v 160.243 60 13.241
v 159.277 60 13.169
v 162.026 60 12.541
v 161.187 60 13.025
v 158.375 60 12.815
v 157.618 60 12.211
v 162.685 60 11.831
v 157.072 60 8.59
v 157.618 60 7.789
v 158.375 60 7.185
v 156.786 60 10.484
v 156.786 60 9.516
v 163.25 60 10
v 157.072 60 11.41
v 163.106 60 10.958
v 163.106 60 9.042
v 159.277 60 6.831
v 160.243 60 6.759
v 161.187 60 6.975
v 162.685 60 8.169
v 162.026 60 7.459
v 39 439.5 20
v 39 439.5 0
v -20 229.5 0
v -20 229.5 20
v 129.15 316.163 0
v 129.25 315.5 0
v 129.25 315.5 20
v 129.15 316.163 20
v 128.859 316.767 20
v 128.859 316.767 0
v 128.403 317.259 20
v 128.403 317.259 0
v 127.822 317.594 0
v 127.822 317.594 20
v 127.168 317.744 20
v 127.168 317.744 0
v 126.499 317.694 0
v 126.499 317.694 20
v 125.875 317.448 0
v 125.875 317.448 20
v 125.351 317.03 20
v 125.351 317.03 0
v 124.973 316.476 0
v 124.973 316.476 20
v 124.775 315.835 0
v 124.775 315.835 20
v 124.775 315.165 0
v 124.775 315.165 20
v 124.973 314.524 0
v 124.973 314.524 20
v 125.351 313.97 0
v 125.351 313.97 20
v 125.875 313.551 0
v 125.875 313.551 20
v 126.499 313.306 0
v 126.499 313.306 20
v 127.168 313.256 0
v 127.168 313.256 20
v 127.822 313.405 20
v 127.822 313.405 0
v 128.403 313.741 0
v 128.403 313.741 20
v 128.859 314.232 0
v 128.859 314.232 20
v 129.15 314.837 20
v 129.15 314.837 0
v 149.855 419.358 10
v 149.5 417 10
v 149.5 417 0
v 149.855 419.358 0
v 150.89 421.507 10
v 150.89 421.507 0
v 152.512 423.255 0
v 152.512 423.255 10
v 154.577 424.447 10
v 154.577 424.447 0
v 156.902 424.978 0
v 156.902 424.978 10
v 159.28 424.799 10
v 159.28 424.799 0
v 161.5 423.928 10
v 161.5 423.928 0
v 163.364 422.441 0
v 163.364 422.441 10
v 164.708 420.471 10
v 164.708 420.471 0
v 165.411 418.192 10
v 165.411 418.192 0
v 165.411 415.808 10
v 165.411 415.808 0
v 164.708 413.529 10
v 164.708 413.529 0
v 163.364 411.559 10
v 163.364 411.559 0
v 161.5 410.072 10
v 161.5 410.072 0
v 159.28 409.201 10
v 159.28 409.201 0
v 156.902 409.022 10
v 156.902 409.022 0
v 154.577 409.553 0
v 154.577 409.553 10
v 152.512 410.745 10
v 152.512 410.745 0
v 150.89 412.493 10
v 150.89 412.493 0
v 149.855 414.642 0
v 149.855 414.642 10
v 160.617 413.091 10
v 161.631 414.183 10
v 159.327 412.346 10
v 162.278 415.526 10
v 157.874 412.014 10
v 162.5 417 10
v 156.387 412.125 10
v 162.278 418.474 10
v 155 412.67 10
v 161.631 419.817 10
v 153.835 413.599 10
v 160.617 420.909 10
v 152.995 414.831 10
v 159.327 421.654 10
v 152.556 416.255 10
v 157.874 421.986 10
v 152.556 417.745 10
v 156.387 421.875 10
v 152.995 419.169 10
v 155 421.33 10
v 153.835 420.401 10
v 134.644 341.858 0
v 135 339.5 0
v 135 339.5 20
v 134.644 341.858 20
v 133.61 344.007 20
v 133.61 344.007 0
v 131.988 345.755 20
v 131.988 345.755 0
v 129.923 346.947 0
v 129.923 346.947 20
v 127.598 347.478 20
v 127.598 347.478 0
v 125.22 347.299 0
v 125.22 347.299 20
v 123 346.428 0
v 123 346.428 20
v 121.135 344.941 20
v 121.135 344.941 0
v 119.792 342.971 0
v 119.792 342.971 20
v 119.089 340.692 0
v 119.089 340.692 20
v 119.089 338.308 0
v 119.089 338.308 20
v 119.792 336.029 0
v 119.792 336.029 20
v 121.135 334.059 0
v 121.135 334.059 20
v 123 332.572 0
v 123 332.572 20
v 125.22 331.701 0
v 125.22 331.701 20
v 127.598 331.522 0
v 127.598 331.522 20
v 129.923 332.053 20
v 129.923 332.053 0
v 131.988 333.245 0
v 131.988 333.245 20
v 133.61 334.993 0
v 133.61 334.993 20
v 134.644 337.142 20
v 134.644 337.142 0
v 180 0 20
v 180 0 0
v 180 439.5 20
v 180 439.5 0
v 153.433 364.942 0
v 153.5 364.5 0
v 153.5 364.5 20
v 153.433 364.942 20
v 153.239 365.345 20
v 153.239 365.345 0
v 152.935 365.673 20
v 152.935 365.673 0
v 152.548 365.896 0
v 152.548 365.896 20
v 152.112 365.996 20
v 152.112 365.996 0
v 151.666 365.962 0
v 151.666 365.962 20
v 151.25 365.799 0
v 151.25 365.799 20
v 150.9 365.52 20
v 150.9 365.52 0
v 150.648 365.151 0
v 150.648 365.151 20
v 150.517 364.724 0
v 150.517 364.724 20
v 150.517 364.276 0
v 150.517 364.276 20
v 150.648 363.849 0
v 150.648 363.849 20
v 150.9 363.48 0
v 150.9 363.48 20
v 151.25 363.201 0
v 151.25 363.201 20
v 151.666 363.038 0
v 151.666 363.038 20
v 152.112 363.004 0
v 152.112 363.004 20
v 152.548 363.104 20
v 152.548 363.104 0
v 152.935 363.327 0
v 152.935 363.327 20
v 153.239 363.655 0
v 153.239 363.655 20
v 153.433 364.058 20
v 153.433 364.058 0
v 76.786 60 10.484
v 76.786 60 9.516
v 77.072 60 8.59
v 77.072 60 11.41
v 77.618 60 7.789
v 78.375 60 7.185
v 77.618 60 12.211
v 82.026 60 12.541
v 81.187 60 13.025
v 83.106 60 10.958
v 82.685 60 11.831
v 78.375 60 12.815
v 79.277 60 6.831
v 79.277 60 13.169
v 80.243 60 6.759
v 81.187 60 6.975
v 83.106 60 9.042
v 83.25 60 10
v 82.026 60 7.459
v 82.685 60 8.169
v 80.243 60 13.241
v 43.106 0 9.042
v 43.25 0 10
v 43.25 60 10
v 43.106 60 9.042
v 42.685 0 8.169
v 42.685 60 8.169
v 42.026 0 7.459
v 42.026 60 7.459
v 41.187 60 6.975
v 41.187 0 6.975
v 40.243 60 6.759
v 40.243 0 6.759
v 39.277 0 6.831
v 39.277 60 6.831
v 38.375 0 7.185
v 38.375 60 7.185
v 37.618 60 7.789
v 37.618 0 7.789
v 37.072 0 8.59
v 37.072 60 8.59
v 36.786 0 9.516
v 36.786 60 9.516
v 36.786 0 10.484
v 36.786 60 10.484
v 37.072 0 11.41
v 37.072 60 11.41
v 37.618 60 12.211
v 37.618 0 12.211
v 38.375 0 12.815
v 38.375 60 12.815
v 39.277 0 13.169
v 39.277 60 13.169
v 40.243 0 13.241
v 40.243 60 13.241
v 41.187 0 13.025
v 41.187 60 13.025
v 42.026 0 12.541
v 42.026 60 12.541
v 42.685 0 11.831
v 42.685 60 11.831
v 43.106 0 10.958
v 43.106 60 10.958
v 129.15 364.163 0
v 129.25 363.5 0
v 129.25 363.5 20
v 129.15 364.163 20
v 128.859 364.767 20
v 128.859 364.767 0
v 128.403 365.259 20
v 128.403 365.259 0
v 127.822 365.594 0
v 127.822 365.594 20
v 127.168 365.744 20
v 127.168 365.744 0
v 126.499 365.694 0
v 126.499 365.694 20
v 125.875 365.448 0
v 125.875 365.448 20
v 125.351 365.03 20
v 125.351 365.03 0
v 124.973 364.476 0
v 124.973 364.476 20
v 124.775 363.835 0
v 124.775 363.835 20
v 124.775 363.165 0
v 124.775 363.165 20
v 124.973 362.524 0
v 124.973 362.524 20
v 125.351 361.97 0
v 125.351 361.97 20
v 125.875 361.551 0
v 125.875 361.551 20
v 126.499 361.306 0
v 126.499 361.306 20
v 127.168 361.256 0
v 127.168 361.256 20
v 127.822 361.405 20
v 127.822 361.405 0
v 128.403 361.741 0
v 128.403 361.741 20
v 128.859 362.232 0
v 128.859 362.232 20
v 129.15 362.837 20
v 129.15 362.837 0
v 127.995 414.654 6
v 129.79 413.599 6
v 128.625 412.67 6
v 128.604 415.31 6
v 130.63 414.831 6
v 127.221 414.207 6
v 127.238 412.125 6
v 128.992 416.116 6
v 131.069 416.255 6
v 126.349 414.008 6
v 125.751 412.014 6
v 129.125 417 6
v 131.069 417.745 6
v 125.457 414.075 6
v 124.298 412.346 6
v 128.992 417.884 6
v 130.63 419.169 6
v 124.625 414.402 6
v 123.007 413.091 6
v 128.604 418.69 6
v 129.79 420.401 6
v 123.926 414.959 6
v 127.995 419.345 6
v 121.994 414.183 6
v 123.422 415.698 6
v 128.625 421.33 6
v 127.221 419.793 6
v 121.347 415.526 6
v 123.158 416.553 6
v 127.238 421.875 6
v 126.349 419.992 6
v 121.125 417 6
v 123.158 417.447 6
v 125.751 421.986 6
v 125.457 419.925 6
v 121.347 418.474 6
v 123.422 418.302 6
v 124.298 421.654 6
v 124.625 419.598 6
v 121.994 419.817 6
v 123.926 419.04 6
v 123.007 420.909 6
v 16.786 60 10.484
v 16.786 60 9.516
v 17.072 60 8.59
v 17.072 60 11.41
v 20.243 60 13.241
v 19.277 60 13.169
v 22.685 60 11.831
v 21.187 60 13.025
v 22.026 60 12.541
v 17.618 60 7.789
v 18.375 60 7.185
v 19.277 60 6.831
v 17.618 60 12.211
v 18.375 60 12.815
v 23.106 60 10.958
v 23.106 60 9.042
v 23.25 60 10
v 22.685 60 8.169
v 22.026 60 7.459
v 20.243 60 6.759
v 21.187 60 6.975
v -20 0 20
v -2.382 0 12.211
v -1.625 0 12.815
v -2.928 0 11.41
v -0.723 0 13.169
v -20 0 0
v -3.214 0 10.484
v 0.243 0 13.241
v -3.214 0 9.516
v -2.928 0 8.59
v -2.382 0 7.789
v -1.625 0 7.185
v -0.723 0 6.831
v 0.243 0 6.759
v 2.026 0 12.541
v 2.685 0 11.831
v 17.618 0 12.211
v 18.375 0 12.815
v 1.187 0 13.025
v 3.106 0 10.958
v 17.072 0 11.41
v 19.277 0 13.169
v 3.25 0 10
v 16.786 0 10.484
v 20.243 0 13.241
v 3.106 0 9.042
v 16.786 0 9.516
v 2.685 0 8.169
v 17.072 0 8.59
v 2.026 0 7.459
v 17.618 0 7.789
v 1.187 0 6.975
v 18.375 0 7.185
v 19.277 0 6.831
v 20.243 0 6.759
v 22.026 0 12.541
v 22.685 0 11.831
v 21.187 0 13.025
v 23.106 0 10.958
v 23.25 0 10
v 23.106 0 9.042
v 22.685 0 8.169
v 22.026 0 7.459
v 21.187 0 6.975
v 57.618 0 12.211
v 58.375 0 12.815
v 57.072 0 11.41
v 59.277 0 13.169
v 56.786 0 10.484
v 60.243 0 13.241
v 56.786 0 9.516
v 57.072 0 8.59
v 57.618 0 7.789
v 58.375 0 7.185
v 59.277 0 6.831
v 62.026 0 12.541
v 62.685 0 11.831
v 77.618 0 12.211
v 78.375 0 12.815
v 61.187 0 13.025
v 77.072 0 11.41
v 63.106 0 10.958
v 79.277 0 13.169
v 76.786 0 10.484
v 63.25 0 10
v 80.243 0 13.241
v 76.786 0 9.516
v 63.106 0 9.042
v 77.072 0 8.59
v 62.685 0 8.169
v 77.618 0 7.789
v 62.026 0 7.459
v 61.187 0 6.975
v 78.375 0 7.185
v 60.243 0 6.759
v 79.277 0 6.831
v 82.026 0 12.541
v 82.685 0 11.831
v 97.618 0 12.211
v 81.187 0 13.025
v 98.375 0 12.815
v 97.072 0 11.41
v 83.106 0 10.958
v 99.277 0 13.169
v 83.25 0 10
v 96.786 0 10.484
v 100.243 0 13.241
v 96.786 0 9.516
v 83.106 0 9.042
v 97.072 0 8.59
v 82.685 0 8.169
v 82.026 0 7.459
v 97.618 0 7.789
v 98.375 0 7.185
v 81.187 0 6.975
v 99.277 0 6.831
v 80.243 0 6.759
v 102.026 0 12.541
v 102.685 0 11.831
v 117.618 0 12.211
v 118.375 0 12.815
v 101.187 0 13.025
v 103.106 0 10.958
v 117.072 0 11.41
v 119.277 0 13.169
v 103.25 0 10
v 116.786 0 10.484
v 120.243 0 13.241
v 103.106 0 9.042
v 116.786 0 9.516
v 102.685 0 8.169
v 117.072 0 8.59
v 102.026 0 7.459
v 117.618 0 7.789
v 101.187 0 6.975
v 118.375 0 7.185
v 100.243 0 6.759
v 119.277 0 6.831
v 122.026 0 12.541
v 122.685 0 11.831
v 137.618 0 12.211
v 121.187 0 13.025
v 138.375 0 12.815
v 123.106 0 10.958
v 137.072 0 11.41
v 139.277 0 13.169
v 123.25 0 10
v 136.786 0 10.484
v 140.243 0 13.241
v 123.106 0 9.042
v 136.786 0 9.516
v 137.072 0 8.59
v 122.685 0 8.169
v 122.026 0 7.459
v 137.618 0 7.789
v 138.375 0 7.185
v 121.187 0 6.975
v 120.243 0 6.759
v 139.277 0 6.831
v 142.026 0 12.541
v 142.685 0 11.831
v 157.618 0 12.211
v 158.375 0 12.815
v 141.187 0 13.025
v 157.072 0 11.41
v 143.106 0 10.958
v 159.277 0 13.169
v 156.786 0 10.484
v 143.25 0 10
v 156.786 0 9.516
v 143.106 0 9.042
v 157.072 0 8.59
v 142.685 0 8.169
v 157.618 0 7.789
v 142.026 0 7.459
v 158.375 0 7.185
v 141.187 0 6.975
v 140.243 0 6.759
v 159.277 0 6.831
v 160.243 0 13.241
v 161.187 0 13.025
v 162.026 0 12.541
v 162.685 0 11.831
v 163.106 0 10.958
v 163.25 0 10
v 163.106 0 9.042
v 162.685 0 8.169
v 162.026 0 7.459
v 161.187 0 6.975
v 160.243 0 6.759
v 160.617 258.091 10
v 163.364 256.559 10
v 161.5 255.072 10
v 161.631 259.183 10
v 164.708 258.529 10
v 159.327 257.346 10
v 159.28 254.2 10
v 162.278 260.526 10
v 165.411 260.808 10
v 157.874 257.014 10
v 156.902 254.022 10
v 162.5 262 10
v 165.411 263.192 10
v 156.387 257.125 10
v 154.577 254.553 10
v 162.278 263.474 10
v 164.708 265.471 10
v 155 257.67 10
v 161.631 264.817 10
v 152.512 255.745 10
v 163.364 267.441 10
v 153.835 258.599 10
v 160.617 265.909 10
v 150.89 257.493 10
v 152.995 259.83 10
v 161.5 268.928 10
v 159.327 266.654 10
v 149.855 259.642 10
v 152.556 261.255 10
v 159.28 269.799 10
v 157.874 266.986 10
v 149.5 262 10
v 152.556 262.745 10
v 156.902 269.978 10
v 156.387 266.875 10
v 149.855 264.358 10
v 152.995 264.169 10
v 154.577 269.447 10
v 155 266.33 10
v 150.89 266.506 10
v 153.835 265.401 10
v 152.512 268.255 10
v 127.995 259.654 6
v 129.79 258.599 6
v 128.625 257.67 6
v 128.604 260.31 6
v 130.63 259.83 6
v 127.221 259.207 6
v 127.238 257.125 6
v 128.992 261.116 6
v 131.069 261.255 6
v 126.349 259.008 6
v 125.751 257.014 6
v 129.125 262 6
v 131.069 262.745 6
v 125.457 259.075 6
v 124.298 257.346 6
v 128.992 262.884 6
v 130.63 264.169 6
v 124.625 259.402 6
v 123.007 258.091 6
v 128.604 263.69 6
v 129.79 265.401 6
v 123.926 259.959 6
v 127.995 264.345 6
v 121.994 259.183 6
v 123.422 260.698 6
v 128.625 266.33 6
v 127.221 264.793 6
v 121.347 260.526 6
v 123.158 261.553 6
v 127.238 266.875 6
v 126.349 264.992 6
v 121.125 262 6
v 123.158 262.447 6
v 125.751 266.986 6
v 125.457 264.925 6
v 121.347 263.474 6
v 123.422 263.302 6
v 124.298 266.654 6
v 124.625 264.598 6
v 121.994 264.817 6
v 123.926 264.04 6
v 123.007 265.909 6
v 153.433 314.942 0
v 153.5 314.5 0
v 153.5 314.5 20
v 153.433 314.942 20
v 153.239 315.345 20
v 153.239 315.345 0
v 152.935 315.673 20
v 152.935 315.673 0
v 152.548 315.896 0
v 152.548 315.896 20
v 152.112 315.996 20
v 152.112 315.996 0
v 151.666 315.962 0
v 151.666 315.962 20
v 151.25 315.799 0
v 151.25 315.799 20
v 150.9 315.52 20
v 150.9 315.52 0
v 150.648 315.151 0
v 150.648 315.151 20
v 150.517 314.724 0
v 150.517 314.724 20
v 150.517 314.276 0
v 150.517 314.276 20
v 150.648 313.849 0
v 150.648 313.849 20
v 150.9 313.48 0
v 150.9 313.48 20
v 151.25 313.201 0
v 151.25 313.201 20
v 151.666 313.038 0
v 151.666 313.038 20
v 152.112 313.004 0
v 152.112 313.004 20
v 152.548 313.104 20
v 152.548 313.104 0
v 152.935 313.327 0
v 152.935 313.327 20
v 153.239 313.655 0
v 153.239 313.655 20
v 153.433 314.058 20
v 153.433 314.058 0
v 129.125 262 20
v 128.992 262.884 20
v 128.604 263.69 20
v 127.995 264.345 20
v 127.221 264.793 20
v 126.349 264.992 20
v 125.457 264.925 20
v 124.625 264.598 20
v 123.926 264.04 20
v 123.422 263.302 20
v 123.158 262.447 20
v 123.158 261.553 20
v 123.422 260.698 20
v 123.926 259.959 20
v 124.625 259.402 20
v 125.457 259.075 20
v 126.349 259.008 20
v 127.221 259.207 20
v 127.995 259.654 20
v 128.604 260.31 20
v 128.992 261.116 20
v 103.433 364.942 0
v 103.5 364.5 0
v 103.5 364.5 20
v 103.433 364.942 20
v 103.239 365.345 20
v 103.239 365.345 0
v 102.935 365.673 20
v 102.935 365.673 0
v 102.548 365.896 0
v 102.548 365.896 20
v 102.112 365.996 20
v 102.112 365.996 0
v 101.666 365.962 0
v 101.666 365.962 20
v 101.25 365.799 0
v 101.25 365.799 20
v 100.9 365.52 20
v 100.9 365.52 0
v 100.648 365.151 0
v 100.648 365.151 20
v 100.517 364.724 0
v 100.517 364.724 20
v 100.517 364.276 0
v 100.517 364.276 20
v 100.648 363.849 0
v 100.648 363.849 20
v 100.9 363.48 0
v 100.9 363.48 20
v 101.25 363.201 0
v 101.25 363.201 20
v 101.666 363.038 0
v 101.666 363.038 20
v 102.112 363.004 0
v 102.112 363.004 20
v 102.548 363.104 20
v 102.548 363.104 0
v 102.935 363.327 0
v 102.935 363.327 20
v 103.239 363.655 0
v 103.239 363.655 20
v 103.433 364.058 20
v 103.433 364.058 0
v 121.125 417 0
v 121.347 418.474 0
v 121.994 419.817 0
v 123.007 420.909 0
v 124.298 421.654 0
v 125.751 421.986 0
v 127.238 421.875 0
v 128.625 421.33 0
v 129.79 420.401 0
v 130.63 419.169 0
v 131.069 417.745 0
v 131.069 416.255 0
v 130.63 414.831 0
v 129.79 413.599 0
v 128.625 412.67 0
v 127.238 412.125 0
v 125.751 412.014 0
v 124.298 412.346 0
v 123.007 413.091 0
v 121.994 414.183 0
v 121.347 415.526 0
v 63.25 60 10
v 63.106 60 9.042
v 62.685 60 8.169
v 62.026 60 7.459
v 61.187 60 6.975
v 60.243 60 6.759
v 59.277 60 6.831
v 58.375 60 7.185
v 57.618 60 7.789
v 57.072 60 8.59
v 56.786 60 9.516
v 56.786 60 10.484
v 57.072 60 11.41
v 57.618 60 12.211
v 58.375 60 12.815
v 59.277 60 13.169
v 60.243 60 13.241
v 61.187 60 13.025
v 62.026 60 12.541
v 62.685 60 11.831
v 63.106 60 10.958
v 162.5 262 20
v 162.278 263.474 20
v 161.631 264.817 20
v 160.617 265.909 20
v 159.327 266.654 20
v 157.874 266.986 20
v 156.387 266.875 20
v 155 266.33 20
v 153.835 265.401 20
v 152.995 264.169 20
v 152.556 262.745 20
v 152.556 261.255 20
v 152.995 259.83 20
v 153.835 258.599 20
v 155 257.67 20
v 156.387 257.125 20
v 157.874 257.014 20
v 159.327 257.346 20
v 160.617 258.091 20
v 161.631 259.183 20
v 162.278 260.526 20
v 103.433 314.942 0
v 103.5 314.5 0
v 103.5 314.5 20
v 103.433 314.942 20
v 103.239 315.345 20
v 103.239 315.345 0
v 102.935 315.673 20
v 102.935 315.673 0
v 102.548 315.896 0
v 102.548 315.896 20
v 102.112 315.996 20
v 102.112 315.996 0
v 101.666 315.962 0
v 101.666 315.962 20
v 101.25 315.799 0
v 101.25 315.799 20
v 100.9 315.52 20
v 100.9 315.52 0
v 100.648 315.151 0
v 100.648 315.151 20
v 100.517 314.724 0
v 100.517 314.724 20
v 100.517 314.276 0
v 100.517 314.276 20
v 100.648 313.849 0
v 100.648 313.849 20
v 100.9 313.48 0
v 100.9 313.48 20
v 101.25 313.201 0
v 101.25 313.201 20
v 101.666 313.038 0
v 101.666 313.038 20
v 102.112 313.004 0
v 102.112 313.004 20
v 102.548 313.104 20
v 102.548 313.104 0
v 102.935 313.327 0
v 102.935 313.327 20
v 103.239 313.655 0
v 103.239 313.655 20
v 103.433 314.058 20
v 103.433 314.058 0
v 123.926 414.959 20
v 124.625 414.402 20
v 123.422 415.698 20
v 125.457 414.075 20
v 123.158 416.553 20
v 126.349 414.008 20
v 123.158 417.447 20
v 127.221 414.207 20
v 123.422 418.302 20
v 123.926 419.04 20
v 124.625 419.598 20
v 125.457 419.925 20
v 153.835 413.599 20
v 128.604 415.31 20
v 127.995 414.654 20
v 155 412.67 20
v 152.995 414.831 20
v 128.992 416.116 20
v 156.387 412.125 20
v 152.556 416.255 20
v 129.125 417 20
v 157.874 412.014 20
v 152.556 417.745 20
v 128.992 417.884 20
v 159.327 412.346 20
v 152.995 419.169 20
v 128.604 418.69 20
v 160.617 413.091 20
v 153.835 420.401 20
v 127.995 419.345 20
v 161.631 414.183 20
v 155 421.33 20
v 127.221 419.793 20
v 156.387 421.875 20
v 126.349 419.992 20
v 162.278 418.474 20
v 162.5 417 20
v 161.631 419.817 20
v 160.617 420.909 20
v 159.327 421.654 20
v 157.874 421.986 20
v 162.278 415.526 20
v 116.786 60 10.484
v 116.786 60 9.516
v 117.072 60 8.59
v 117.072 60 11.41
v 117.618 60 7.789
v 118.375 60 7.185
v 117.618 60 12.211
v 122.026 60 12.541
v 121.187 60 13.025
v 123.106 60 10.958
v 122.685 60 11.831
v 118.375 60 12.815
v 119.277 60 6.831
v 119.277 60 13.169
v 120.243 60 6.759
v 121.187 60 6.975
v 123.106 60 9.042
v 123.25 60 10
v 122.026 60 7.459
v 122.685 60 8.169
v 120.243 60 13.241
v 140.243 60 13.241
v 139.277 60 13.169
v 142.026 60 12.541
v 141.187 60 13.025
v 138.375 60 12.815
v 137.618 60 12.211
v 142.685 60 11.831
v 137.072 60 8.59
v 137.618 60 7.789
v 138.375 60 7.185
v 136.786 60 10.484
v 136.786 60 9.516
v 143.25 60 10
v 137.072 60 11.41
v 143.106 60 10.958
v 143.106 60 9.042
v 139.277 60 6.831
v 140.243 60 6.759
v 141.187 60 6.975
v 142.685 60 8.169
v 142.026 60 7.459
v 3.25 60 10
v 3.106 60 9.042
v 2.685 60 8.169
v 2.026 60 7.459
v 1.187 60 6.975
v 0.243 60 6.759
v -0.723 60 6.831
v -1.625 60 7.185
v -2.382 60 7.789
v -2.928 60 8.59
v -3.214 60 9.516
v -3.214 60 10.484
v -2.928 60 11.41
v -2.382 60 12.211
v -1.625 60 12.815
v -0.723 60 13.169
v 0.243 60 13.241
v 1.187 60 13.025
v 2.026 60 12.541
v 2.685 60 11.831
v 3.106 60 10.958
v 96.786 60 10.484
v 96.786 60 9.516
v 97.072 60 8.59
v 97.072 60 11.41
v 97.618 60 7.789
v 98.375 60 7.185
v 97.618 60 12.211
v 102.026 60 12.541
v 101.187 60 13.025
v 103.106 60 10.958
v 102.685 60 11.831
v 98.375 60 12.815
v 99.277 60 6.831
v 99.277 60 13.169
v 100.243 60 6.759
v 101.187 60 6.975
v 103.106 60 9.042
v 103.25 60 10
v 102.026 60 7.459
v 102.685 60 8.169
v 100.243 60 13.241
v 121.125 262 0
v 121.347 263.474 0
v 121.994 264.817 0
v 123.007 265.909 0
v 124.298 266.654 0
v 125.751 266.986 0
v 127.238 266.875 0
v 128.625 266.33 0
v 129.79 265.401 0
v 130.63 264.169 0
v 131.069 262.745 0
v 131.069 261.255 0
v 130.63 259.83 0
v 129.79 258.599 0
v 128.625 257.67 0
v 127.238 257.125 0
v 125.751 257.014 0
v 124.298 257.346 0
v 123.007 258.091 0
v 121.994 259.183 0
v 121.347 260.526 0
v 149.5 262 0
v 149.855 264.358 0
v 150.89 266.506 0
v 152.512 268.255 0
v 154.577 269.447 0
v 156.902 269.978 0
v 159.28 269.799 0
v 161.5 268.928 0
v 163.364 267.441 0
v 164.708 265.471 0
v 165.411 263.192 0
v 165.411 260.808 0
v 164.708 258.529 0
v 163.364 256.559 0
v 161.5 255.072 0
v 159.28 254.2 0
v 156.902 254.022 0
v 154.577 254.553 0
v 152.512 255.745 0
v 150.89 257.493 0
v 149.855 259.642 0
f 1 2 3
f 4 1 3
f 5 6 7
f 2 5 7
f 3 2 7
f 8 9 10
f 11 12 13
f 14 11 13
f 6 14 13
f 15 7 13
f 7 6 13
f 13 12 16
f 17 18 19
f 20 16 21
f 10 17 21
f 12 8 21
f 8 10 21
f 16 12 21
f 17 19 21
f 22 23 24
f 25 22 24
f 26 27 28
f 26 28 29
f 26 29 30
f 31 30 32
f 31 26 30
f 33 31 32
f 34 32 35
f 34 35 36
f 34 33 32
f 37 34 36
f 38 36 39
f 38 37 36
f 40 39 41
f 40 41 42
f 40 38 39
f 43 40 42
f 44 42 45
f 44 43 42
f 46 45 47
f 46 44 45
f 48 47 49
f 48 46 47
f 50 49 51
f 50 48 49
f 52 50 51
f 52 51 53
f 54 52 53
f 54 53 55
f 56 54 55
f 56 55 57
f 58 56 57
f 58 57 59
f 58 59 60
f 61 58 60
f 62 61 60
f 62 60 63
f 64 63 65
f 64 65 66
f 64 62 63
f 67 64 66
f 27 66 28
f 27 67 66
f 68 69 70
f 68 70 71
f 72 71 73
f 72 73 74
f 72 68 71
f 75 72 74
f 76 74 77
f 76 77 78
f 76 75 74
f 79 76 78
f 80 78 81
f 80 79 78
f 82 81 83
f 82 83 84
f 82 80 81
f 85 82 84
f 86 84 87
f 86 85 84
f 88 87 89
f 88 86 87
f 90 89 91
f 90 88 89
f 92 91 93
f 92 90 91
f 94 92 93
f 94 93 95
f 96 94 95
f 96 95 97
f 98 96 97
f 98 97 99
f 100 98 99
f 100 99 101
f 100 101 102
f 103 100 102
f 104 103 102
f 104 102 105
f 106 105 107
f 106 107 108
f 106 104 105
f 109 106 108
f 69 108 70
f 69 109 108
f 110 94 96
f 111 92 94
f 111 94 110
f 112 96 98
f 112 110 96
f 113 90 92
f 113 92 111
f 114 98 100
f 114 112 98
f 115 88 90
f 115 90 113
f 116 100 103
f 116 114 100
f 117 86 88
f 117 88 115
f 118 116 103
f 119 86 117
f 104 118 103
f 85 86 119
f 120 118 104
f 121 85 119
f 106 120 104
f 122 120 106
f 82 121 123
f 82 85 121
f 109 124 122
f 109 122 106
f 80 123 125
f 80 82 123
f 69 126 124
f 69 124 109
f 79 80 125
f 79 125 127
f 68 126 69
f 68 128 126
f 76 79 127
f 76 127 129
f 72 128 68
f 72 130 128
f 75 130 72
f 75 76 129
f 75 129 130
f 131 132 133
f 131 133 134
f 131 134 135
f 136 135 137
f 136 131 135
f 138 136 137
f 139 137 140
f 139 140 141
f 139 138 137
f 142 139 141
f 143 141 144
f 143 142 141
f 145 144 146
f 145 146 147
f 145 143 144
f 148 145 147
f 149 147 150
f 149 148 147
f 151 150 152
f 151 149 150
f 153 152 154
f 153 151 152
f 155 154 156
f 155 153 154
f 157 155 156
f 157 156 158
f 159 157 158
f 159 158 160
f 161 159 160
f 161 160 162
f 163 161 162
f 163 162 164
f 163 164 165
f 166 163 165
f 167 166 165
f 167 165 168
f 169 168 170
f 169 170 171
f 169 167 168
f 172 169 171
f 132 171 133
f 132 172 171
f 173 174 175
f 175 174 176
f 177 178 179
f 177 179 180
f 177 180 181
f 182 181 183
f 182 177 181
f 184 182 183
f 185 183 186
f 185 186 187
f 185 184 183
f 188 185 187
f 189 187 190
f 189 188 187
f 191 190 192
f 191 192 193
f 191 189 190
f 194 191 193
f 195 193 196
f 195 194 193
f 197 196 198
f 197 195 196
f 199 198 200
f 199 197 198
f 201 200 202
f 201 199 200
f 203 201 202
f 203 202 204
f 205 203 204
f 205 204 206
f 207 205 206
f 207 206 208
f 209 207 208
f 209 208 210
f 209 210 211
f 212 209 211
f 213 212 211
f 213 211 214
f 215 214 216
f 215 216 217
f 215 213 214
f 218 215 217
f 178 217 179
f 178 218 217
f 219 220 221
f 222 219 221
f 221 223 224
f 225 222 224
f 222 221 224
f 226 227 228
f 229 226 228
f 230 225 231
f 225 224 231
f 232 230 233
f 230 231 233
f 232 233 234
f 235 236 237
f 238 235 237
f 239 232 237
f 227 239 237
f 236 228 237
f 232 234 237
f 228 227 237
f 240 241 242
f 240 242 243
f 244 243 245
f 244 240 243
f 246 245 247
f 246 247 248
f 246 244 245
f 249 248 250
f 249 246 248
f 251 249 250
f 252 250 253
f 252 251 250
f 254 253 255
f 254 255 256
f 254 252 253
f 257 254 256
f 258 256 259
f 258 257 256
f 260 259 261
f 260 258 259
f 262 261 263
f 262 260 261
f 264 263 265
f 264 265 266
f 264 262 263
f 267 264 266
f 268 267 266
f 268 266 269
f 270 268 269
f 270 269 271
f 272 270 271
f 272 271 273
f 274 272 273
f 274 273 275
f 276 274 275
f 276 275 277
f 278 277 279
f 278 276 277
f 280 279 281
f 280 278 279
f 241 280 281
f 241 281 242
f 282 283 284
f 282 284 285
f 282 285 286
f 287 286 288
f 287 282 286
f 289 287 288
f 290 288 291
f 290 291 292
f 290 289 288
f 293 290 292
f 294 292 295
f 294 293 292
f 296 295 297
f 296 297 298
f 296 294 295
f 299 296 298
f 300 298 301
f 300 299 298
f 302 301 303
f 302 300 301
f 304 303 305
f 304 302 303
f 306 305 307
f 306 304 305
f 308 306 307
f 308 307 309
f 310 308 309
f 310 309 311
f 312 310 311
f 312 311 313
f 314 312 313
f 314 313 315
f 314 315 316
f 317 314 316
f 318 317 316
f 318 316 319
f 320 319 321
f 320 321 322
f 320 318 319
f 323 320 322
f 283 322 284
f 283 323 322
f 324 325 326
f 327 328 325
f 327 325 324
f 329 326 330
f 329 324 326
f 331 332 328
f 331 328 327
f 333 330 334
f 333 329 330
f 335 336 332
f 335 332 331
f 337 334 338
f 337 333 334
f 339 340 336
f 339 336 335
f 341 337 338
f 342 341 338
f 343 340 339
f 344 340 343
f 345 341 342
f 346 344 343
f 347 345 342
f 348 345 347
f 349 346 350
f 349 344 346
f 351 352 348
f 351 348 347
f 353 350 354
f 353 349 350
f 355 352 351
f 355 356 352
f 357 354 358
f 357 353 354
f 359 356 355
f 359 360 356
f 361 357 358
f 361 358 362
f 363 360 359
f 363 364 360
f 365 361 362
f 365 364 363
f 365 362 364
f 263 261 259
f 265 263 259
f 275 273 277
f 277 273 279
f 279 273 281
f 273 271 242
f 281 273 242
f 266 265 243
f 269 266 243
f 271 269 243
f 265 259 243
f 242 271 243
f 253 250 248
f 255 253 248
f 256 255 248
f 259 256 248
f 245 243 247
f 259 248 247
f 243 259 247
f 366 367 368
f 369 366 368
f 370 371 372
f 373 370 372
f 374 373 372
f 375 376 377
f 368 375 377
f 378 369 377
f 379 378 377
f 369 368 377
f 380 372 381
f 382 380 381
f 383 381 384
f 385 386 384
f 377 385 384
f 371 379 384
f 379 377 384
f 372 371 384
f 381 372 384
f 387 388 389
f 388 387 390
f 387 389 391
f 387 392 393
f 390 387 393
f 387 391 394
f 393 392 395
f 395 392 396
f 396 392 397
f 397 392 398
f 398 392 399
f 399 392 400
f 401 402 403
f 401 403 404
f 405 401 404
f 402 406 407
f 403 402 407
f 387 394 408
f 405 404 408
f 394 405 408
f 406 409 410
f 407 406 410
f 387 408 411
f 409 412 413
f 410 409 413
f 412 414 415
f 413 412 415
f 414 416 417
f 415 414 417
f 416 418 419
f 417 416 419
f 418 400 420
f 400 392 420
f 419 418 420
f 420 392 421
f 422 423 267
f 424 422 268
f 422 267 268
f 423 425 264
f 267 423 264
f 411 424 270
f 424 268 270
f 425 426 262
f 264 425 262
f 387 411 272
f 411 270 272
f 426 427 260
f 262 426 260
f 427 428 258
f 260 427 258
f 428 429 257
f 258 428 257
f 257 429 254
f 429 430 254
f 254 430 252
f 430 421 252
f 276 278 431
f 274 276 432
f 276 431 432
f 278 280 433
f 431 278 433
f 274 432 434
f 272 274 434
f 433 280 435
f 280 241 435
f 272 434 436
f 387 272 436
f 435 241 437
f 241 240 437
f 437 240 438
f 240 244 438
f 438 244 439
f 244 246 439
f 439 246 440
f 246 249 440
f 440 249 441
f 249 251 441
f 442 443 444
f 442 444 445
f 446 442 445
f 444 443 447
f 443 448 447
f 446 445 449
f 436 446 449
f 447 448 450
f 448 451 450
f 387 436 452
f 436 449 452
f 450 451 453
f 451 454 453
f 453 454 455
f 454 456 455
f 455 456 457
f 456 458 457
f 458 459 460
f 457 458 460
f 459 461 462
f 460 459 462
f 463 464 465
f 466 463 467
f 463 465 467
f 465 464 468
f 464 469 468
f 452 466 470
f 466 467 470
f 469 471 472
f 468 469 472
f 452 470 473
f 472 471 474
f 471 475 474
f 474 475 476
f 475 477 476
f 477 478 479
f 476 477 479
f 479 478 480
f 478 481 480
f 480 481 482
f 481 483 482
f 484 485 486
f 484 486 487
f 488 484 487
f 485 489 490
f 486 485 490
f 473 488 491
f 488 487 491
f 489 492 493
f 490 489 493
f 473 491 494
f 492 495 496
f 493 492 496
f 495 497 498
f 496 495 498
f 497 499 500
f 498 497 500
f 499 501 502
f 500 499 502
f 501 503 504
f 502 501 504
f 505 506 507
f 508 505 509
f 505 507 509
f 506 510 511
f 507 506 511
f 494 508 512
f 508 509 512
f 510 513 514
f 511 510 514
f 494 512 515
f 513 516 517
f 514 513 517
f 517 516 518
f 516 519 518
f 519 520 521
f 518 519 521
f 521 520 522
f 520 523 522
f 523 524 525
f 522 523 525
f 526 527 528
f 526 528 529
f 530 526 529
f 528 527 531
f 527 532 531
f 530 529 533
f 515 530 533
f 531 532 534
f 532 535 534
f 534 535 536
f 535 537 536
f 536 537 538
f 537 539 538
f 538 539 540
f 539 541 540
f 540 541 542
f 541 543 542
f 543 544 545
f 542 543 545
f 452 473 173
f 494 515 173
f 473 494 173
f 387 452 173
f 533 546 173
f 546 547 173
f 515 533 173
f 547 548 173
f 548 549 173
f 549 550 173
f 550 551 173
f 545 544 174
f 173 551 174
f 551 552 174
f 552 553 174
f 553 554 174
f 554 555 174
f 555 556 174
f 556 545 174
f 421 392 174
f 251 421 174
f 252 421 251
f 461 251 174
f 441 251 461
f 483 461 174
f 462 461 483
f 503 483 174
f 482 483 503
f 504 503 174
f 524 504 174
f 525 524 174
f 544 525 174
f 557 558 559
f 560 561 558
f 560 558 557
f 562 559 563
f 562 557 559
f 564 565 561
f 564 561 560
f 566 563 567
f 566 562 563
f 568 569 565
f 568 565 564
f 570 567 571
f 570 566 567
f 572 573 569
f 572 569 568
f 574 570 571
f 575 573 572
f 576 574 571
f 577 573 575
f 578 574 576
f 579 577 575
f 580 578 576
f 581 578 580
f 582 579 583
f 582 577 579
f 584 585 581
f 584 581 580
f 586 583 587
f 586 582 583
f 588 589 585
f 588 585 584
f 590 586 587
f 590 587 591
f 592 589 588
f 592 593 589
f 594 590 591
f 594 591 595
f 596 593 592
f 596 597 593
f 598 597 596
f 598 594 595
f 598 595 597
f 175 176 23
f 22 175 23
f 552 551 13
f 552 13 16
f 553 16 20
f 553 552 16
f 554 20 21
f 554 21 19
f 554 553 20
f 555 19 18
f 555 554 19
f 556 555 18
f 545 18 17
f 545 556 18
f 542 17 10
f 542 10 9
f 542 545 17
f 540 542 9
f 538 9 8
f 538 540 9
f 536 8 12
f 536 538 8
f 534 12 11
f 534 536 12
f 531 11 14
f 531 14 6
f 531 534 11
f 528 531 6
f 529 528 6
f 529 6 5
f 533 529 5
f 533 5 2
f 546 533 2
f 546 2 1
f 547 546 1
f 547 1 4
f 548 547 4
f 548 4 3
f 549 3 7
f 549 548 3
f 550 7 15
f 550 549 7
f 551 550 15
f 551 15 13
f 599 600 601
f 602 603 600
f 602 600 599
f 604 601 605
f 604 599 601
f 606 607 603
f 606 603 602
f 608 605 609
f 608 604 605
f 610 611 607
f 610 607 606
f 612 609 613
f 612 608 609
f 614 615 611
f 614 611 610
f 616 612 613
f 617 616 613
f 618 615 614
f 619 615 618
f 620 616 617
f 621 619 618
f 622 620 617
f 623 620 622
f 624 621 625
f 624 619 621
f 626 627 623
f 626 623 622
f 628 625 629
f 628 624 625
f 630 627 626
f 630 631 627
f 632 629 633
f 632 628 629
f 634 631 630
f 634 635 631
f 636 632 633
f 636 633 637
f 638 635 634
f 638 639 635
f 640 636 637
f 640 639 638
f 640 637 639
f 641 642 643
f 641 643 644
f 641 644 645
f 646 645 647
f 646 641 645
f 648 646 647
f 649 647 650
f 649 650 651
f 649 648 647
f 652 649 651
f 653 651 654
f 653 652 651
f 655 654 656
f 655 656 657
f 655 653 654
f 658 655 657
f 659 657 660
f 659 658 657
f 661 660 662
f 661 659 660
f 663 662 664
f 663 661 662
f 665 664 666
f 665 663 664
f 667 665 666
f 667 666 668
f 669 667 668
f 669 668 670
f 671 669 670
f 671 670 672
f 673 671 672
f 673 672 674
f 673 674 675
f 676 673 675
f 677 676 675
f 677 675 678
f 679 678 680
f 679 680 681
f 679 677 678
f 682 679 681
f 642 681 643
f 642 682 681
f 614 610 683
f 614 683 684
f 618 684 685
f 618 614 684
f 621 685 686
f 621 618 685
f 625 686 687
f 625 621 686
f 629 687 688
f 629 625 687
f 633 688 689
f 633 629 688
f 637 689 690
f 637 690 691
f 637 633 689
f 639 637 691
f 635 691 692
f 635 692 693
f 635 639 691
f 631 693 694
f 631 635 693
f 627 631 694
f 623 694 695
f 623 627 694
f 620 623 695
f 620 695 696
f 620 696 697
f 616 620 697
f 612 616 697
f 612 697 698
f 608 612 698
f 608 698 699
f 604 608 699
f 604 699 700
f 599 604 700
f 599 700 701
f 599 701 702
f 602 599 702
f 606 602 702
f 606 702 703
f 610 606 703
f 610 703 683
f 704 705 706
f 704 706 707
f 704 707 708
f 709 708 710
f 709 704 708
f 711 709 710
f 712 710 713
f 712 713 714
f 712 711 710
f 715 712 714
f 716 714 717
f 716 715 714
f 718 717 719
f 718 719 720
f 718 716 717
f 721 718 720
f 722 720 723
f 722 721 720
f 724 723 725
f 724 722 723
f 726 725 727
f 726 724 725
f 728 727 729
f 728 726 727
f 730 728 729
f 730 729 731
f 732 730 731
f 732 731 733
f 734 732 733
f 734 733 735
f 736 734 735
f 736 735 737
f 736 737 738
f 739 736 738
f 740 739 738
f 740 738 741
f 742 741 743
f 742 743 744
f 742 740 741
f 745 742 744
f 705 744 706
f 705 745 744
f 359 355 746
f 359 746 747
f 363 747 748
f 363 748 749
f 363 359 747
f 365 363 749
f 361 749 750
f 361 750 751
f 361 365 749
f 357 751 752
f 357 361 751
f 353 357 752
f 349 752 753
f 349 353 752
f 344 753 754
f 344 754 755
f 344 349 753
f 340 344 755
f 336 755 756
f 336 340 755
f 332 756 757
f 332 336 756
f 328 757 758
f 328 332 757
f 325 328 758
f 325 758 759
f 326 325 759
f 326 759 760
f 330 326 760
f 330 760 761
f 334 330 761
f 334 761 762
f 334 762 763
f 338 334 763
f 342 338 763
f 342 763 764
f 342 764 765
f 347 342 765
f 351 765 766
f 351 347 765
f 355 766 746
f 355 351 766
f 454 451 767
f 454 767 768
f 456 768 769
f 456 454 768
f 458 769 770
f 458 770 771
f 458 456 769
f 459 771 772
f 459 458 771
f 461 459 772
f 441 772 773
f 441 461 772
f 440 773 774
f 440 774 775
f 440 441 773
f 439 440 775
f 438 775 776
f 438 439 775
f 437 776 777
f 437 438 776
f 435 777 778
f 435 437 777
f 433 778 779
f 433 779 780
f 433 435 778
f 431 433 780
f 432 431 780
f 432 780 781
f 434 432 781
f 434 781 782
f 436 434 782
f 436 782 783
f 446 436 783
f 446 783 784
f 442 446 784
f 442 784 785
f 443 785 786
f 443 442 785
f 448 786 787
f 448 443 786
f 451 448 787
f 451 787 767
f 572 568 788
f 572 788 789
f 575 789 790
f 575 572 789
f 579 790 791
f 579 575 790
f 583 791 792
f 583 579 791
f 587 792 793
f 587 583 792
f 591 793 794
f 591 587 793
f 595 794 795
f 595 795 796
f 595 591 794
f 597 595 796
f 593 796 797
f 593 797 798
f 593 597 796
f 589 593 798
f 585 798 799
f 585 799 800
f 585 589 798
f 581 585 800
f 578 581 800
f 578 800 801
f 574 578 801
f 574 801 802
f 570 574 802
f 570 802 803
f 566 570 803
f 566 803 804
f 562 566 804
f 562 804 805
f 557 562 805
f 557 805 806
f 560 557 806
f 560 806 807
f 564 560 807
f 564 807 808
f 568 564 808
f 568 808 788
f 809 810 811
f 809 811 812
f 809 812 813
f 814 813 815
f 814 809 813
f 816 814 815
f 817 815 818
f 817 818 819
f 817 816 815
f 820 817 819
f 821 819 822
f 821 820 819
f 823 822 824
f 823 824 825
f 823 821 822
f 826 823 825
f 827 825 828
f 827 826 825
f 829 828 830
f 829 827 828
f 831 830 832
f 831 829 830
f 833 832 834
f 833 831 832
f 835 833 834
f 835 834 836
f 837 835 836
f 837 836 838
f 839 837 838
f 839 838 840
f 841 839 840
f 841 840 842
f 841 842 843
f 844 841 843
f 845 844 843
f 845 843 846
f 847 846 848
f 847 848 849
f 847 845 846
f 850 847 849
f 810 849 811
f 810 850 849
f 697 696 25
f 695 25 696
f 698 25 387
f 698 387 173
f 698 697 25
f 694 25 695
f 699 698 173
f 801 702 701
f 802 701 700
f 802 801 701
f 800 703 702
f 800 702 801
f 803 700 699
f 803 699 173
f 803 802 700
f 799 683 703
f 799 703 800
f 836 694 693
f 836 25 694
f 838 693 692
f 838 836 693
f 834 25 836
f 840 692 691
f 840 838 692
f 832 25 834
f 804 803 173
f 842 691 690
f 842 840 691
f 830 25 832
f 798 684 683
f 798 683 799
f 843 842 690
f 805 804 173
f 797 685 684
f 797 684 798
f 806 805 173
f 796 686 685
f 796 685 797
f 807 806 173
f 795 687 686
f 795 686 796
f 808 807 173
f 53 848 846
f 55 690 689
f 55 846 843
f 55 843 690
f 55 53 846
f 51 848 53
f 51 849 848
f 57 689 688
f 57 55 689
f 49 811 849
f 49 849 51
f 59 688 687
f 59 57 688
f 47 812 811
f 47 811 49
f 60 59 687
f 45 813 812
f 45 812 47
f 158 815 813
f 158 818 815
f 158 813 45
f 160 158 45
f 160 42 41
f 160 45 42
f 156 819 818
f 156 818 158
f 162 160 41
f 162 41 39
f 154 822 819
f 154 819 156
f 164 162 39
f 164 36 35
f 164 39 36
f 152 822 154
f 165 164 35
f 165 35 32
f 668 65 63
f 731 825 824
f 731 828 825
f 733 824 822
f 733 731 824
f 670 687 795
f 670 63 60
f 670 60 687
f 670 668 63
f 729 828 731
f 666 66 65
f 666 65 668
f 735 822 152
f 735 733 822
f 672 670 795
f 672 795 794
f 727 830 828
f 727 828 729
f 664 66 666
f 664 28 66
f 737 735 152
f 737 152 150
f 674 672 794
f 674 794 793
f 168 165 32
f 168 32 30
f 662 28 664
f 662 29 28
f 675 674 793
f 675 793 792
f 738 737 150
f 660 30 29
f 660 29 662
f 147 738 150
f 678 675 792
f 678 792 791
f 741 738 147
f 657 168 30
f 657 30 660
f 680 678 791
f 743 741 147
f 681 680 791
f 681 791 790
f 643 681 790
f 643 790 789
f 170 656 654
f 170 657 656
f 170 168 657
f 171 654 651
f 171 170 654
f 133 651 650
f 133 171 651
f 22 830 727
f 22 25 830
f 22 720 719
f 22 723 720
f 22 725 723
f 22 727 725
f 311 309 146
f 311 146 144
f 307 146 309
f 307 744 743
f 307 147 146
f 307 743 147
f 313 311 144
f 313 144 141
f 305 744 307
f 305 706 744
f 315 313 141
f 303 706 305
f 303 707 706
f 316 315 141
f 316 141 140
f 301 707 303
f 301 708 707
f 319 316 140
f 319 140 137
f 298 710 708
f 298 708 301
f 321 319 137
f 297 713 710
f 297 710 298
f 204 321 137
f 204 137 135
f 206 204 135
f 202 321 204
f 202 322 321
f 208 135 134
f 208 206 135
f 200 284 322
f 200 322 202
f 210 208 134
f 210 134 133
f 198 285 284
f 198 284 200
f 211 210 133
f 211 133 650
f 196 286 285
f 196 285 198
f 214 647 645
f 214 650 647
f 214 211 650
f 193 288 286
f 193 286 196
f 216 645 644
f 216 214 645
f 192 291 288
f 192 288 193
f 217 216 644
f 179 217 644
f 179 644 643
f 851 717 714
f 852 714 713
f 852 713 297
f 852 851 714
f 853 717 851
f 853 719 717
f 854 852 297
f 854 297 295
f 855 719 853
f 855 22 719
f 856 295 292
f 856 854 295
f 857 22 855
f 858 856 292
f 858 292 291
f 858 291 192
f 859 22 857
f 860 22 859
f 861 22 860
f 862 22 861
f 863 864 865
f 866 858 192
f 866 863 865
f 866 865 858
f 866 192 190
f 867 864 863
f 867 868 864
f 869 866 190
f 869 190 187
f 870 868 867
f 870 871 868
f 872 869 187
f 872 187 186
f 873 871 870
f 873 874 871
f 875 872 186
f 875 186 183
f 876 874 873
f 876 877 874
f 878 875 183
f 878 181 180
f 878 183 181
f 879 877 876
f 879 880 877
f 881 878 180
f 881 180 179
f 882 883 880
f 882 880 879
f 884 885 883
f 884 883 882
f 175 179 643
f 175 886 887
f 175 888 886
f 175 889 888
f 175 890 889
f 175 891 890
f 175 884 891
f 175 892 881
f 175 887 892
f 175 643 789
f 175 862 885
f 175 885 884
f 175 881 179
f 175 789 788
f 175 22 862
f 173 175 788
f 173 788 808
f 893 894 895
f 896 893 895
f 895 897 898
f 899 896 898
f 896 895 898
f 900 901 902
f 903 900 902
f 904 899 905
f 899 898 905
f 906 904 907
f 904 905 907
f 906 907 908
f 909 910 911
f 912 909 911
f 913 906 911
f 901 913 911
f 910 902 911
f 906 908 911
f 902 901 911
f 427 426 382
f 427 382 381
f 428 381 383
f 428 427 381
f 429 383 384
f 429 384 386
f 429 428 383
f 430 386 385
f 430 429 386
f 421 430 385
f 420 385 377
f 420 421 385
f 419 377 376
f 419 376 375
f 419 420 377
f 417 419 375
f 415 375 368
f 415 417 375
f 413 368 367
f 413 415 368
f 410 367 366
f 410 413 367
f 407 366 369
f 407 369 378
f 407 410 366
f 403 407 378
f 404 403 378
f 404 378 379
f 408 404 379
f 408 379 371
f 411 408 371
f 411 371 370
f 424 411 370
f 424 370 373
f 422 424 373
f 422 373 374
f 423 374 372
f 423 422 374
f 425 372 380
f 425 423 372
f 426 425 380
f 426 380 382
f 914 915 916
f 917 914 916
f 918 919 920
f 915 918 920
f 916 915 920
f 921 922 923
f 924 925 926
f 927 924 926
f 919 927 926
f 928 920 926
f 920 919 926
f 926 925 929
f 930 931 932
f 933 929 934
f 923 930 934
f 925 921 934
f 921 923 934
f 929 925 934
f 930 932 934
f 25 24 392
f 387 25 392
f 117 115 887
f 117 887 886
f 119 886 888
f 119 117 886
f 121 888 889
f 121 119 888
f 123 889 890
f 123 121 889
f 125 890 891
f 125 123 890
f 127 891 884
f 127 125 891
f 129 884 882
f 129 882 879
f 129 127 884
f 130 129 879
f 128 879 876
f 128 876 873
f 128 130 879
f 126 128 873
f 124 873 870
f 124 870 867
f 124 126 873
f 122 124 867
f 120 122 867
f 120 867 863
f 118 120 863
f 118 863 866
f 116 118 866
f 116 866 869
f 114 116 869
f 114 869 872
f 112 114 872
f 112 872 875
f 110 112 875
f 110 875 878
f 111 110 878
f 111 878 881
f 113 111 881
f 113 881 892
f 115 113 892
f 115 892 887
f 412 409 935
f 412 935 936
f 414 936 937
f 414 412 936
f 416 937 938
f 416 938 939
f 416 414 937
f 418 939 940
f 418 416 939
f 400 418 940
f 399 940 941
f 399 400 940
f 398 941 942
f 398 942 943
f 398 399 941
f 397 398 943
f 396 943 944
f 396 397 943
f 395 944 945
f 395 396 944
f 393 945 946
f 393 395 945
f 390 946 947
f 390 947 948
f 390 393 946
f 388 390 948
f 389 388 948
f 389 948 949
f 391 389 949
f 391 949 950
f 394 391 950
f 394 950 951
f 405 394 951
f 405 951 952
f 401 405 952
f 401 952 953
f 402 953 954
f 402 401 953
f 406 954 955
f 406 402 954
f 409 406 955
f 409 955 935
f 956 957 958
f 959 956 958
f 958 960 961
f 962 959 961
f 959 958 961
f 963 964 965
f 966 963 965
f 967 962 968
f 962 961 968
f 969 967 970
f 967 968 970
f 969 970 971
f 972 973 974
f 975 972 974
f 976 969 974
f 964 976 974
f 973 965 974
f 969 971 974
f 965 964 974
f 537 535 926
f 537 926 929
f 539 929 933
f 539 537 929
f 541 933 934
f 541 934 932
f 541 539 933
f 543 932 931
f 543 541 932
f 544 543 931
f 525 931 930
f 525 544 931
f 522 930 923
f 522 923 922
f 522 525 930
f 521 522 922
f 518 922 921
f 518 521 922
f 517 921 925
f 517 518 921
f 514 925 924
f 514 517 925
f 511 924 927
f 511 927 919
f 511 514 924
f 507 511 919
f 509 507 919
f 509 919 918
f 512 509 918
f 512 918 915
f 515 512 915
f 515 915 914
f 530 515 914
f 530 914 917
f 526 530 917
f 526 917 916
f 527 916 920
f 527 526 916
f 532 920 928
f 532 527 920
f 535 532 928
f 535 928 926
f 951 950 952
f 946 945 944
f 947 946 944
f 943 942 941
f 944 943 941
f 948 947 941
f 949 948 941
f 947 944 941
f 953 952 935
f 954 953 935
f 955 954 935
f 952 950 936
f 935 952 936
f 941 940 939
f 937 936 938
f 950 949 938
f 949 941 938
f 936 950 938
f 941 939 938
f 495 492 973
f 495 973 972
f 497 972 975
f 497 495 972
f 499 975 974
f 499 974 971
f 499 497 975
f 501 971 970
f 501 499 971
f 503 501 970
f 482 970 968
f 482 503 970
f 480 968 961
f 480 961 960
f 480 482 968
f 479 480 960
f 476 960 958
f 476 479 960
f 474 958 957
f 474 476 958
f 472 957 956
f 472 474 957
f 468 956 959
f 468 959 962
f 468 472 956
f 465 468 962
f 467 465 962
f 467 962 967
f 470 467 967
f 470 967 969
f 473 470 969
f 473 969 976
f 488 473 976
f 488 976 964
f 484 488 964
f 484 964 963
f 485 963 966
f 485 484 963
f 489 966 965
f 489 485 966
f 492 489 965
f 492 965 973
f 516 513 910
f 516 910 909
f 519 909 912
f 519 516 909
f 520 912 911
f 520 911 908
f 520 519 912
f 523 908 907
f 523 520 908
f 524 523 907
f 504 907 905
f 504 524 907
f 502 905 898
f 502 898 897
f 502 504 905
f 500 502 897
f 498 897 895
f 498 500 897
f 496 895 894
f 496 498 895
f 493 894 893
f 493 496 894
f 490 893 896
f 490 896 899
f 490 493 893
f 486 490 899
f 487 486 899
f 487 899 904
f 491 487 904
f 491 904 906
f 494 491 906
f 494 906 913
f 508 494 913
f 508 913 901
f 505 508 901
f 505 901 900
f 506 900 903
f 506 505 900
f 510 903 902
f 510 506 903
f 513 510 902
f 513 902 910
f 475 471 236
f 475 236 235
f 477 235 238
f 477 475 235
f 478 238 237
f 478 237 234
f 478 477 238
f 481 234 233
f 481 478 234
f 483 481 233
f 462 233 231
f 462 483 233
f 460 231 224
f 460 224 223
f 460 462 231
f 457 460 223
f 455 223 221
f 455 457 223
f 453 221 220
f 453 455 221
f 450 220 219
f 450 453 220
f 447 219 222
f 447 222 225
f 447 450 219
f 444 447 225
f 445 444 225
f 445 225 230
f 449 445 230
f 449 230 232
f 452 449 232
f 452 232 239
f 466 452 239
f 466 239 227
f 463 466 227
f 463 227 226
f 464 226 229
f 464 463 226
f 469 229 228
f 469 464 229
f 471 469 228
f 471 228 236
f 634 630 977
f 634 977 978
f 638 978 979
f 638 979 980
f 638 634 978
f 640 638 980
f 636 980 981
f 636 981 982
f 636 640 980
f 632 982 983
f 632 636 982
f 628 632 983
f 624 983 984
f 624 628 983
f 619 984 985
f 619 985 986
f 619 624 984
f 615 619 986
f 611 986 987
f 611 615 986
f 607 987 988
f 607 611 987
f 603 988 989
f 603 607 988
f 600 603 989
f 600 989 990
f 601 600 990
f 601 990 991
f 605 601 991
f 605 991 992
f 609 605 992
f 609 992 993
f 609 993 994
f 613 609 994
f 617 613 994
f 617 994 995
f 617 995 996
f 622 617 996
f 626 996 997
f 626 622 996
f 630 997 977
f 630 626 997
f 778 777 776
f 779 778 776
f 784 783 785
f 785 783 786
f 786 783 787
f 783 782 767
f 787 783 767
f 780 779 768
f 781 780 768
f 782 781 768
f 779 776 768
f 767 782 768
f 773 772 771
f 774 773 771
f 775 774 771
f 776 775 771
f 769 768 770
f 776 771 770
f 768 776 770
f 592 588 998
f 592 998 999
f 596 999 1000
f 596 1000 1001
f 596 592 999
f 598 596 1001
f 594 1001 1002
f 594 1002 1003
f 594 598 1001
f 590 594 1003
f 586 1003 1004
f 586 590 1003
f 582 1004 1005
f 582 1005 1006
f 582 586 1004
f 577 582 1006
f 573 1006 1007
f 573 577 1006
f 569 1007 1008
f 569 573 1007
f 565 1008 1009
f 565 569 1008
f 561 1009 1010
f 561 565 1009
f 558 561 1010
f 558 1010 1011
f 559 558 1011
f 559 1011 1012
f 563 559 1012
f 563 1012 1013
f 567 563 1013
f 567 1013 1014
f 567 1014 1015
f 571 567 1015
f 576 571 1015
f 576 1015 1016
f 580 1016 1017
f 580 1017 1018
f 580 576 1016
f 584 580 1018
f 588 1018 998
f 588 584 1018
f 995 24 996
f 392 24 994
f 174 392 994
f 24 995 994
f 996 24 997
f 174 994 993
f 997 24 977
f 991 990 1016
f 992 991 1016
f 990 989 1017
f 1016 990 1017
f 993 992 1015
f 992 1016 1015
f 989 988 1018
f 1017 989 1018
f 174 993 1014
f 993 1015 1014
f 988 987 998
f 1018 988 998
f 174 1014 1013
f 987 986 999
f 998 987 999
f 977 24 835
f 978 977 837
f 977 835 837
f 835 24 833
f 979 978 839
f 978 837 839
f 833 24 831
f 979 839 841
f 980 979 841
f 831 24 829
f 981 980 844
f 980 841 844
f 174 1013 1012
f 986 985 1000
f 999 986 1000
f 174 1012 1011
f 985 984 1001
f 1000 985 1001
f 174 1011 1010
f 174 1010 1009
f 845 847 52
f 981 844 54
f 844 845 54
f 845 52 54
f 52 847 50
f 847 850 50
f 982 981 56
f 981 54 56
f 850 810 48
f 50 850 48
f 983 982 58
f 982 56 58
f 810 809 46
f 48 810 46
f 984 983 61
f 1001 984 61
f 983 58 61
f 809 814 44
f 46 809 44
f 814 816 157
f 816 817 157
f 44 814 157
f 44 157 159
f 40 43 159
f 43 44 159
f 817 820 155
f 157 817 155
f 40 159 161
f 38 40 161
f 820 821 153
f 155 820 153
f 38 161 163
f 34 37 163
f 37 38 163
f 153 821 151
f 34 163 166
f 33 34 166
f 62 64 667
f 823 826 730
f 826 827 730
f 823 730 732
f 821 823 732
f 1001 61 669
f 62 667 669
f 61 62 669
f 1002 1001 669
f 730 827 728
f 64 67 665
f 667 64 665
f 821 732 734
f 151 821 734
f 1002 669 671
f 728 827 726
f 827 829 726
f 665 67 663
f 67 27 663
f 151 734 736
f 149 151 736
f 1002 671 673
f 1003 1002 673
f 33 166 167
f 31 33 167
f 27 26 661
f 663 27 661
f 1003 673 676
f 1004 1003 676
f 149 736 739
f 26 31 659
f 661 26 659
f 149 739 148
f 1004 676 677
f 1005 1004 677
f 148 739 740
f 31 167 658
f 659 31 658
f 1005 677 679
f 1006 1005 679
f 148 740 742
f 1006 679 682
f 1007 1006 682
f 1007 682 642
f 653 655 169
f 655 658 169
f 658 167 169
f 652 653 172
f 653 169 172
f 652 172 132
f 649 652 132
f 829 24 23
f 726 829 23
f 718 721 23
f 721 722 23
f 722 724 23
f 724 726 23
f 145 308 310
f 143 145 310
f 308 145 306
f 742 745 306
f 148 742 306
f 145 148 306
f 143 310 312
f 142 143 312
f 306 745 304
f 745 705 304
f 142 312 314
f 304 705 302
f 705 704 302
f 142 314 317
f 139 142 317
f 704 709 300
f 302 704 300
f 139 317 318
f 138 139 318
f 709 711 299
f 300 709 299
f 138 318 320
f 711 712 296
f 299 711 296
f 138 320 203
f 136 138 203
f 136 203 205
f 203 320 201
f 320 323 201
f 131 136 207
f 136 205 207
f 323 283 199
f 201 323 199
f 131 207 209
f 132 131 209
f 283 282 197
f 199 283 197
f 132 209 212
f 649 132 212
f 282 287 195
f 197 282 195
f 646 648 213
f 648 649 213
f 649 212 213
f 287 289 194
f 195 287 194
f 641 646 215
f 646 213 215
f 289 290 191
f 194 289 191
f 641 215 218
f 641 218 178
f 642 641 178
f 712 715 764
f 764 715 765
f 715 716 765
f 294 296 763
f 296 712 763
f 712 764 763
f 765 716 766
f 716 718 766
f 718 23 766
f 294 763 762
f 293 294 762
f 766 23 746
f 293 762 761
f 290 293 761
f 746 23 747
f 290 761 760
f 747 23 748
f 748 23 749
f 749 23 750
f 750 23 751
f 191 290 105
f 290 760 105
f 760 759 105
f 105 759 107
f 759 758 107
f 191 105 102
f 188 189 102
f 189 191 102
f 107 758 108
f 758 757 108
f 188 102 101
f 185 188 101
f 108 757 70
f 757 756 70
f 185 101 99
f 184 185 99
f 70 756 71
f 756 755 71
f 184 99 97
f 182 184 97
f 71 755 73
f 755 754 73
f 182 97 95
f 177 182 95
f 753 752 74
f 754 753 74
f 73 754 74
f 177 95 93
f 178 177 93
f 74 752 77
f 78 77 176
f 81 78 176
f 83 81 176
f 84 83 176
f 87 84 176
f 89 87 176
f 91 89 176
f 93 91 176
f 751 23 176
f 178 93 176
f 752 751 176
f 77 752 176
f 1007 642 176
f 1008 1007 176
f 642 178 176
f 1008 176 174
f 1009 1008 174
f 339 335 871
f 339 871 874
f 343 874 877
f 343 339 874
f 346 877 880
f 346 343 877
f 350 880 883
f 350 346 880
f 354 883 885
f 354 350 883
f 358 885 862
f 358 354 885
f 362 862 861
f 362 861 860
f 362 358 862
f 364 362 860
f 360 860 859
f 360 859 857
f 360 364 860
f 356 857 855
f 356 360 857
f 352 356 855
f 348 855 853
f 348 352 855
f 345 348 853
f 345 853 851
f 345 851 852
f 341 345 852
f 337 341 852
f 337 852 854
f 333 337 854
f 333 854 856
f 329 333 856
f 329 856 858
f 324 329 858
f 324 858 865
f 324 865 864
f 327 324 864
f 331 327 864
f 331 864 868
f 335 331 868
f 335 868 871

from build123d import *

# Parameters (mm, degrees)
SKETCH1_R                  = 8
SKETCH1_R_2                = 5
SKETCH1_R_3                = 2.25
SKETCH1_R_4                = 1.5
SKETCH1_R_5                = 3
EXTRUDE1_DEPTH             = 20
CUT_EXTRUDE1_START         = -10
CUT_EXTRUDE1_OUTLINE_R     = 8
CUT_EXTRUDE1_OUTLINE_R_2   = 5
CUT_EXTRUDE1_DEPTH         = 10
CUT_EXTRUDE1_START_2       = -6
CUT_EXTRUDE1_2_OUTLINE_R   = 5
CUT_EXTRUDE1_2_OUTLINE_R_2 = 3
CUT_EXTRUDE1_2_DEPTH       = 6
CUT_EXTRUDE1_3_OUTLINE_R   = 3.25
CUT_EXTRUDE1_3_DEPTH       = 60


# Read off the part's stored shape, not the designer's step: Cut-Extrude1
with BuildPart() as part:
    # Sketch1 → Extrude1 (new body)
    with BuildSketch(Plane.XY):
        Polygon((38.999908, 439.49994136), (-20, 229.49994136), (-20, 0), (180, 0), (180, 20), (180, 439.50001453), align=None)
        with Locations((126.999908, 339.49994136)):
            Circle(SKETCH1_R, mode=Mode.SUBTRACT)
        with Locations((157.49992067, 416.99997068)):
            Circle(SKETCH1_R_2, mode=Mode.SUBTRACT)
        with Locations((126.999908, 363.49994136)):
            Circle(SKETCH1_R_3, mode=Mode.SUBTRACT)
        with Locations((126.999908, 315.49994136)):
            Circle(SKETCH1_R_3, mode=Mode.SUBTRACT)
        with Locations((157.49992067, 261.99991204)):
            Circle(SKETCH1_R_2, mode=Mode.SUBTRACT)
        with Locations((151.999908, 364.49994136)):
            Circle(SKETCH1_R_4, mode=Mode.SUBTRACT)
        with Locations((151.999908, 314.49994136)):
            Circle(SKETCH1_R_4, mode=Mode.SUBTRACT)
        with Locations((101.999908, 364.49994136)):
            Circle(SKETCH1_R_4, mode=Mode.SUBTRACT)
        with Locations((101.999908, 314.49994136)):
            Circle(SKETCH1_R_4, mode=Mode.SUBTRACT)
        with Locations((126.12492067, 416.99997068)):
            Circle(SKETCH1_R_5, mode=Mode.SUBTRACT)
        with Locations((126.12492067, 261.99991204)):
            Circle(SKETCH1_R_5, mode=Mode.SUBTRACT)
    extrude(amount=EXTRUDE1_DEPTH)

    # Cut-Extrude1 outline → Cut-Extrude1 (cut)
    # profile 1 of 2: a face of its own
    with BuildSketch(Plane(origin=(0, 0, 0), x_dir=(-1, 0, 0), z_dir=(0, 0, -1)).offset(CUT_EXTRUDE1_START)):
        with Locations((-157.49992067, 416.99997068)):
            Circle(CUT_EXTRUDE1_OUTLINE_R)
        with Locations((-157.49992067, 416.99997068)):
            Circle(CUT_EXTRUDE1_OUTLINE_R_2, mode=Mode.SUBTRACT)
    # profile 2 of 2: a face of its own
    with BuildSketch(Plane(origin=(0, 0, 0), x_dir=(-1, 0, 0), z_dir=(0, 0, -1)).offset(CUT_EXTRUDE1_START)):
        with Locations((-157.49992067, 261.99991204)):
            Circle(CUT_EXTRUDE1_OUTLINE_R)
        with Locations((-157.49992067, 261.99991204)):
            Circle(CUT_EXTRUDE1_OUTLINE_R_2, mode=Mode.SUBTRACT)
    extrude(amount=CUT_EXTRUDE1_DEPTH, mode=Mode.SUBTRACT)

    # Cut-Extrude1 2 outline → Cut-Extrude1 2 (cut)
    # profile 1 of 2: a face of its own
    with BuildSketch(Plane(origin=(0, 0, 0), x_dir=(-1, 0, 0), z_dir=(0, 0, -1)).offset(CUT_EXTRUDE1_START_2)):
        with Locations((-126.12492067, 416.99997068)):
            Circle(CUT_EXTRUDE1_2_OUTLINE_R)
        with Locations((-126.12492067, 416.99997068)):
            Circle(CUT_EXTRUDE1_2_OUTLINE_R_2, mode=Mode.SUBTRACT)
    # profile 2 of 2: a face of its own
    with BuildSketch(Plane(origin=(0, 0, 0), x_dir=(-1, 0, 0), z_dir=(0, 0, -1)).offset(CUT_EXTRUDE1_START_2)):
        with Locations((-126.12492067, 261.99991204)):
            Circle(CUT_EXTRUDE1_2_OUTLINE_R)
        with Locations((-126.12492067, 261.99991204)):
            Circle(CUT_EXTRUDE1_2_OUTLINE_R_2, mode=Mode.SUBTRACT)
    extrude(amount=CUT_EXTRUDE1_2_DEPTH, mode=Mode.SUBTRACT)

    # Cut-Extrude1 3 outline → Cut-Extrude1 3 (cut)
    with BuildSketch(Plane(origin=(0, 0, 0), x_dir=(1, 0, 0), z_dir=(0, 1, 0))):
        with Locations((20, -10)):
            Circle(CUT_EXTRUDE1_3_OUTLINE_R)
        with Locations((40, -10)):
            Circle(CUT_EXTRUDE1_3_OUTLINE_R)
        with Locations((60, -10)):
            Circle(CUT_EXTRUDE1_3_OUTLINE_R)
        with Locations((80, -10)):
            Circle(CUT_EXTRUDE1_3_OUTLINE_R)
        with Locations((100, -10)):
            Circle(CUT_EXTRUDE1_3_OUTLINE_R)
        with Locations((120, -10)):
            Circle(CUT_EXTRUDE1_3_OUTLINE_R)
        with Locations((140, -10)):
            Circle(CUT_EXTRUDE1_3_OUTLINE_R)
        with Locations((160, -10)):
            Circle(CUT_EXTRUDE1_3_OUTLINE_R)
        with Locations((0, -10)):
            Circle(CUT_EXTRUDE1_3_OUTLINE_R)
    extrude(amount=CUT_EXTRUDE1_3_DEPTH, mode=Mode.SUBTRACT)


solid = part.part
